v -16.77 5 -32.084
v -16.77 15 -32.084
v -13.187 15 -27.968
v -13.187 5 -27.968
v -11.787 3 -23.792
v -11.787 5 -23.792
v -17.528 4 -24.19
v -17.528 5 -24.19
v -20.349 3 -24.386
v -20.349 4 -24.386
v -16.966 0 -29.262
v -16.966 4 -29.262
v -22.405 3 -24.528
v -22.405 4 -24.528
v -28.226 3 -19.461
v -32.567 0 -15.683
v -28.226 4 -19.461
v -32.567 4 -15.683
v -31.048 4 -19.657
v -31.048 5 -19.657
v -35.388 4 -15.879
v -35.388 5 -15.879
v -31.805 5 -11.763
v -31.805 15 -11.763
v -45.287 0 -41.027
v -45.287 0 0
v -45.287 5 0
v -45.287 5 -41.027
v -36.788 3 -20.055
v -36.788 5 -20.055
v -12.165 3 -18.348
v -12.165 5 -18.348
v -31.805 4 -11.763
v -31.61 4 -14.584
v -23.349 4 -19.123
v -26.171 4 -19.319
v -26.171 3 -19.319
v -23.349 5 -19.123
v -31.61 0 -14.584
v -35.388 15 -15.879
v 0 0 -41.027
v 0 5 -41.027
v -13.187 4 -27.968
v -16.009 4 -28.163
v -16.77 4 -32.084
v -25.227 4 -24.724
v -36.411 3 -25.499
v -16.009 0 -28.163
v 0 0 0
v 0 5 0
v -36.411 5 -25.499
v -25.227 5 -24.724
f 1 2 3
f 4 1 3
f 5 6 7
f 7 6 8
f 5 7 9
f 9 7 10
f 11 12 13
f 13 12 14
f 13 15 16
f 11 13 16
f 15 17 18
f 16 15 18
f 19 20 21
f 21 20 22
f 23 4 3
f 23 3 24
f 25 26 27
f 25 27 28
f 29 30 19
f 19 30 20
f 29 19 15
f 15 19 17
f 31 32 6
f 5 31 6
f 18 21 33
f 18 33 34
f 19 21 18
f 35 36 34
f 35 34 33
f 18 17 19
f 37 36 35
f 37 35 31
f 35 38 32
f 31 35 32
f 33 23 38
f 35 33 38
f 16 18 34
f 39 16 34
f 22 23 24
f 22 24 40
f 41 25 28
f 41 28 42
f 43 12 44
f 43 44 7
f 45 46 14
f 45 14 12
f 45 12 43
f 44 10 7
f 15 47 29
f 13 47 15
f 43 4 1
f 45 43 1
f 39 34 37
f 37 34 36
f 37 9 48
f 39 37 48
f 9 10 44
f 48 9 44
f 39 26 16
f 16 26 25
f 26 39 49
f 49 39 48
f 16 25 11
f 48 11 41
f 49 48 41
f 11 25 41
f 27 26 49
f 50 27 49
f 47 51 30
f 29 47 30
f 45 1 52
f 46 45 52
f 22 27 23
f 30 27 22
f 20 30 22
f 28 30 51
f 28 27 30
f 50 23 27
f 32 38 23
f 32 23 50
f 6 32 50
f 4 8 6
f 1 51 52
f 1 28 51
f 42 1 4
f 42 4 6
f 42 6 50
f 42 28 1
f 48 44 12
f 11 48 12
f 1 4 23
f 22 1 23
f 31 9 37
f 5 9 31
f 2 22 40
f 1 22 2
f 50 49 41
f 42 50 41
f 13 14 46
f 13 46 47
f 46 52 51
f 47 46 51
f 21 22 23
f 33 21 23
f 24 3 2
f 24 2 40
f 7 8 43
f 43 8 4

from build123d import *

# Parameters (mm, degrees)
SKIZZE1_W                          = 45.286676114
SKIZZE1_H                          = 41.027038262
AUFSATZ_LINEAR_AUSTRAGEN1_DEPTH    = 5
AUFSATZ_LINEAR_AUSTRAGEN2_DEPTH    = 10
SCHNITT_LINEAR_AUSTRAGEN1_DEPTH    = 1
K_RPER_VERSCHIEBEN_KOPIEREN1_ANGLE = 45
SCHNITT_LINEAR_AUSTRAGEN2_DEPTH    = 2
K_RPER_VERSCHIEBEN_KOPIEREN2_ANGLE = 45
SCHNITT_LINEAR_AUSTRAGEN3_DEPTH    = 7


with BuildPart() as part:
    # Skizze1 → Aufsatz-Linear austragen1 (new body)
    with BuildSketch(Plane(origin=(0, 0, 0), x_dir=(1, 0, 0), z_dir=(0, 1, 0))):
        with Locations((-22.643338057, 20.513519131)):
            Rectangle(SKIZZE1_W, SKIZZE1_H)
    extrude(amount=AUFSATZ_LINEAR_AUSTRAGEN1_DEPTH)

    # Skizze3 → Schnitt-Linear austragen1 (cut)
    with BuildSketch(Plane(origin=(0, 5, 0), x_dir=(1, 0, 0), z_dir=(0, 1, 0))):
        Polygon((-35.388215561, 15.87901822), (-31.805473355, 11.762755891), (-13.187281399, 27.967792593), (-16.770023605, 32.084054922), align=None)
    extrude(amount=-SCHNITT_LINEAR_AUSTRAGEN1_DEPTH, mode=Mode.SUBTRACT)

    # Skizze4 → Schnitt-Linear austragen2 (cut)
    with BuildSketch(Plane(origin=(0, 5, 0), x_dir=(1, 0, 0), z_dir=(0, 1, 0))):
        Polygon((-36.410991195, 25.498593786), (-36.788246892, 20.054575471), (-12.164505765, 18.348217027), (-11.787250068, 23.792235342), align=None)
    extrude(amount=-SCHNITT_LINEAR_AUSTRAGEN2_DEPTH, mode=Mode.SUBTRACT)

    # Skizze5 → Schnitt-Linear austragen3 (cut)
    with BuildSketch(Plane(origin=(0, 5, 0), x_dir=(1, 0, 0), z_dir=(0, 1, 0))):
        Polygon((-32.566555289, 15.68348482), (-31.609939954, 14.584416163), (-16.008941671, 28.163325994), (-16.965557005, 29.262394651), align=None)
    extrude(amount=-SCHNITT_LINEAR_AUSTRAGEN3_DEPTH, mode=Mode.SUBTRACT)


with BuildPart() as body_2:
    # Skizze2 → Aufsatz-Linear austragen2 (new body)
    with BuildSketch(Plane(origin=(0, 5, 0), x_dir=(1, 0, 0), z_dir=(0, 1, 0))):
        Polygon((-35.388215561, 15.87901822), (-16.770023605, 32.084054922), (-13.187281399, 27.967792593), (-31.805473355, 11.762755891), align=None)
    extrude(amount=AUFSATZ_LINEAR_AUSTRAGEN2_DEPTH)


with BuildPart() as body_2_1:
    # K_rper-Verschieben_Kopieren1: moved
    add(body_2.part.rotate(Axis((-24.28774848, 0, -21.923405407), (0, -1, 0)), K_RPER_VERSCHIEBEN_KOPIEREN1_ANGLE))


with BuildPart() as body_2_2:
    # K_rper-Verschieben_Kopieren2: moved
    add(body_2_1.part.rotate(Axis((-24.28774848, 0, -21.923405407), (0, 1, 0)), K_RPER_VERSCHIEBEN_KOPIEREN2_ANGLE))


solid = Compound([part.part, body_2_2.part])
